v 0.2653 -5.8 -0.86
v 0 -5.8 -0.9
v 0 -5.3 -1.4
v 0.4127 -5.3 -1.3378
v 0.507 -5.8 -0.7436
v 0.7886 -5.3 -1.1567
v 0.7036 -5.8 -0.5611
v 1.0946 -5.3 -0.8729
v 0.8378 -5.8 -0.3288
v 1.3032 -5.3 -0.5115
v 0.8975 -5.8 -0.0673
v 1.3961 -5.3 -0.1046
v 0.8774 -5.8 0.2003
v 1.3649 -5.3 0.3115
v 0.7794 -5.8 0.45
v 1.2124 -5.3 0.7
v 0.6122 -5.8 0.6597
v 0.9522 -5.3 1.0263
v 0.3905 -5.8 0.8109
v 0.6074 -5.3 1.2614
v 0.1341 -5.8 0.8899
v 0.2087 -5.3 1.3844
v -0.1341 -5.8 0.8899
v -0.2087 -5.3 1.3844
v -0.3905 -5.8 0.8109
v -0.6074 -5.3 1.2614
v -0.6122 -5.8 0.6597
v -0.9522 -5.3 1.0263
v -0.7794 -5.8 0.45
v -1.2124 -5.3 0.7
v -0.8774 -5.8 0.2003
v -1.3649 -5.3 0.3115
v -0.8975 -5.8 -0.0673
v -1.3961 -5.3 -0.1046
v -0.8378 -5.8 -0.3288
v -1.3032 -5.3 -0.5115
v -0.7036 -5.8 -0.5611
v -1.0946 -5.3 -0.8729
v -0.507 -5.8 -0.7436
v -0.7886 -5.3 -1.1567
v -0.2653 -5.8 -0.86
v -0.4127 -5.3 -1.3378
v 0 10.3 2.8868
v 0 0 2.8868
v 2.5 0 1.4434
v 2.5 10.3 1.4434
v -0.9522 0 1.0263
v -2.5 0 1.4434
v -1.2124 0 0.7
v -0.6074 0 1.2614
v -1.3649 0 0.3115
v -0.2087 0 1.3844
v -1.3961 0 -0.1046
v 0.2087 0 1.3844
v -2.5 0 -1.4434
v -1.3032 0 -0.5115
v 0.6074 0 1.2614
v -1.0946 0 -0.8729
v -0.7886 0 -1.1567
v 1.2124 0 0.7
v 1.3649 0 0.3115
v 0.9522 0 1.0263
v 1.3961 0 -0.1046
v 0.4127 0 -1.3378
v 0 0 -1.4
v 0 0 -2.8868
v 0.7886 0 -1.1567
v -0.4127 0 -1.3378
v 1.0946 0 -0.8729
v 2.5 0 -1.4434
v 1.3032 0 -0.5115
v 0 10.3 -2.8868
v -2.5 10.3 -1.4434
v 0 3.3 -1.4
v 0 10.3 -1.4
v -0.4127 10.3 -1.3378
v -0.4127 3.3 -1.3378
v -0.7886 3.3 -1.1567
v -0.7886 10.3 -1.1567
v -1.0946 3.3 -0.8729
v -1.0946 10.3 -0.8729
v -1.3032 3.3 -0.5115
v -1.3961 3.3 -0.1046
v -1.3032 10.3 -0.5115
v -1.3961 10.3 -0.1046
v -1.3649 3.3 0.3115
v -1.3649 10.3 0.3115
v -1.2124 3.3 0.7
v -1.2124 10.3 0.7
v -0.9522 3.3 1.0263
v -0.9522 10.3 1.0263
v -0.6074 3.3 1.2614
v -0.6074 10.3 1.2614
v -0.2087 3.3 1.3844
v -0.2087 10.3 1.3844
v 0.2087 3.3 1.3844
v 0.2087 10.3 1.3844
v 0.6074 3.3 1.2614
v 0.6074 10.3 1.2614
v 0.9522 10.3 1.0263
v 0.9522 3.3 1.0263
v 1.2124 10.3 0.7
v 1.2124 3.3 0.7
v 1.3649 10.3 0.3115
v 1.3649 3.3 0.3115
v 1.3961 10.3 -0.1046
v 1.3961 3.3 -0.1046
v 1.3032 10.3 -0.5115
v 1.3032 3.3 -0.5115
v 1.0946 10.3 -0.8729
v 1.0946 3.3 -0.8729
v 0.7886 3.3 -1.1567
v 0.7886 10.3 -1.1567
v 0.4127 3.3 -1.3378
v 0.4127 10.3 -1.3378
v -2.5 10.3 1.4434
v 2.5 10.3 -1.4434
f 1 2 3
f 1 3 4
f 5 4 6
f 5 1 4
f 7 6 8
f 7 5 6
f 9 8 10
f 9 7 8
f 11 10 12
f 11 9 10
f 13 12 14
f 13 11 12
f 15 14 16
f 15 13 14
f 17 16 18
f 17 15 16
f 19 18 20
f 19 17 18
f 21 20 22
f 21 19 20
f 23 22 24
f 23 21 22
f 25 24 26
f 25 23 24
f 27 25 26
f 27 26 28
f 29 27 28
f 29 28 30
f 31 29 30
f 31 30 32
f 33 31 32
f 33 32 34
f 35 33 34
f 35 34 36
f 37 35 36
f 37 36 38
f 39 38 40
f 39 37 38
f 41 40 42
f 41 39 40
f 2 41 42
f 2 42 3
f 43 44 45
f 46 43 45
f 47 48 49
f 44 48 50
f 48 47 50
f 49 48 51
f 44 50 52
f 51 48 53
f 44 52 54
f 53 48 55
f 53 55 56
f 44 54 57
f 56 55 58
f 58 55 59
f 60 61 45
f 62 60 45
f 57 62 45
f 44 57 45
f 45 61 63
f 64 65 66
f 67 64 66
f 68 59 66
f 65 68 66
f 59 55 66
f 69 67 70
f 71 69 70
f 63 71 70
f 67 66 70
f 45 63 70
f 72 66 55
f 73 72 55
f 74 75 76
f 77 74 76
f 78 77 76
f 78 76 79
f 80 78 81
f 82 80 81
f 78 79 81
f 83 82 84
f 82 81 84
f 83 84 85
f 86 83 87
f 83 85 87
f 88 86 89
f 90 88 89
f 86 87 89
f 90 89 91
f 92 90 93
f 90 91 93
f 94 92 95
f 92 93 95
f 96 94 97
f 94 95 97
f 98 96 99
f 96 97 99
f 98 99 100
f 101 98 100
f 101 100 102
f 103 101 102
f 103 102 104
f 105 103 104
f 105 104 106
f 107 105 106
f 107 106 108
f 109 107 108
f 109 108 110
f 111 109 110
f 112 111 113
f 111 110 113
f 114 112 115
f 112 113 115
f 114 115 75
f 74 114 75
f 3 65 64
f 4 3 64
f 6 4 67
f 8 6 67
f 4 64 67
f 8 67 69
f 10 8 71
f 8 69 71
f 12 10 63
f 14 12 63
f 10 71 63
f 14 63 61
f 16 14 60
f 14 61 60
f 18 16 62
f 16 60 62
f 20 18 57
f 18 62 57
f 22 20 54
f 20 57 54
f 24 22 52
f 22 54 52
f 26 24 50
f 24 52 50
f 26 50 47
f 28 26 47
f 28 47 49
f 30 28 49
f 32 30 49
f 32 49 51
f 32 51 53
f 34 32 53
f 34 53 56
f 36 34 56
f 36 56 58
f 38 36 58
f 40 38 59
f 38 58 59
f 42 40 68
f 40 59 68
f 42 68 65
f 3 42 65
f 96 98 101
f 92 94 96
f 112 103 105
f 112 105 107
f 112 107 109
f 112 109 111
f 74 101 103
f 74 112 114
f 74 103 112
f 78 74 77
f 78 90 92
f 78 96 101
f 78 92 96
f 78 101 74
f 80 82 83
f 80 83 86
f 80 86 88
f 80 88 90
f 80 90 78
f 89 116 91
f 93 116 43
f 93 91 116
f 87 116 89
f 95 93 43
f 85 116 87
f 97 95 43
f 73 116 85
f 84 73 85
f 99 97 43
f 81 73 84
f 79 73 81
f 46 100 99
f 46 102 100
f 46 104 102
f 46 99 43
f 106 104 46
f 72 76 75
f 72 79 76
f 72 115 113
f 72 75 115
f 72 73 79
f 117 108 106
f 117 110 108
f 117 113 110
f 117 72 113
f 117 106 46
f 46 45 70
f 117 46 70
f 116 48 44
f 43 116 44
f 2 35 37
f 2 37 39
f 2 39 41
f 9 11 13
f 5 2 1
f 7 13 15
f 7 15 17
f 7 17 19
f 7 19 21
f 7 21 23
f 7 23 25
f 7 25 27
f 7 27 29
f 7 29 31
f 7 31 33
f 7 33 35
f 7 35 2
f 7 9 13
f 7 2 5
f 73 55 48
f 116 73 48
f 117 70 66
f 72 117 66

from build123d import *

# Parameters (mm, degrees)
EXTRUDE_1_DEPTH     = 10.3
SKETCH_2_R          = 1.4
EXTRUDE_2_DEPTH     = 5.8
CHAMFER_1_SIZE      = 0.5
SKETCH_3_R          = 1.4
CUT_EXTRUDE_1_DEPTH = 7


with BuildPart() as part:
    # Эскиз1 → Бобышка-Вытянуть1 (new body)
    with BuildSketch(Plane(origin=(0, 0, 0), x_dir=(1, 0, 0), z_dir=(0, 1, 0))):
        Polygon((0, 2.886751346), (-2.5, 1.443375673), (-2.5, -1.443375673), (0, -2.886751346), (2.5, -1.443375673), (2.5, 1.443375673), align=None)
    extrude(amount=EXTRUDE_1_DEPTH)

    # Эскиз2 → Бобышка-Вытянуть2 (add)
    with BuildSketch(Plane.XZ):
        with Locations(Location((0, 0, 0), (0, 0, 270))):
            Circle(SKETCH_2_R)
    extrude(amount=EXTRUDE_2_DEPTH)

    # Фаска1
    chamfer_1_edges = [part.edges().sort_by_distance(p)[0] for p in [
        (0, -5.8, 1.4),
    ]]
    chamfer(chamfer_1_edges, length=CHAMFER_1_SIZE)

    # Эскиз3 → Вырез-Вытянуть1 (cut)
    with BuildSketch(Plane(origin=(0, 10.3, 0), x_dir=(1, 0, 0), z_dir=(0, 1, 0))):
        with Locations(Location((0, 0, 0), (0, 0, 90))):
            Circle(SKETCH_3_R)
    extrude(amount=-CUT_EXTRUDE_1_DEPTH, mode=Mode.SUBTRACT)


solid = part.part
